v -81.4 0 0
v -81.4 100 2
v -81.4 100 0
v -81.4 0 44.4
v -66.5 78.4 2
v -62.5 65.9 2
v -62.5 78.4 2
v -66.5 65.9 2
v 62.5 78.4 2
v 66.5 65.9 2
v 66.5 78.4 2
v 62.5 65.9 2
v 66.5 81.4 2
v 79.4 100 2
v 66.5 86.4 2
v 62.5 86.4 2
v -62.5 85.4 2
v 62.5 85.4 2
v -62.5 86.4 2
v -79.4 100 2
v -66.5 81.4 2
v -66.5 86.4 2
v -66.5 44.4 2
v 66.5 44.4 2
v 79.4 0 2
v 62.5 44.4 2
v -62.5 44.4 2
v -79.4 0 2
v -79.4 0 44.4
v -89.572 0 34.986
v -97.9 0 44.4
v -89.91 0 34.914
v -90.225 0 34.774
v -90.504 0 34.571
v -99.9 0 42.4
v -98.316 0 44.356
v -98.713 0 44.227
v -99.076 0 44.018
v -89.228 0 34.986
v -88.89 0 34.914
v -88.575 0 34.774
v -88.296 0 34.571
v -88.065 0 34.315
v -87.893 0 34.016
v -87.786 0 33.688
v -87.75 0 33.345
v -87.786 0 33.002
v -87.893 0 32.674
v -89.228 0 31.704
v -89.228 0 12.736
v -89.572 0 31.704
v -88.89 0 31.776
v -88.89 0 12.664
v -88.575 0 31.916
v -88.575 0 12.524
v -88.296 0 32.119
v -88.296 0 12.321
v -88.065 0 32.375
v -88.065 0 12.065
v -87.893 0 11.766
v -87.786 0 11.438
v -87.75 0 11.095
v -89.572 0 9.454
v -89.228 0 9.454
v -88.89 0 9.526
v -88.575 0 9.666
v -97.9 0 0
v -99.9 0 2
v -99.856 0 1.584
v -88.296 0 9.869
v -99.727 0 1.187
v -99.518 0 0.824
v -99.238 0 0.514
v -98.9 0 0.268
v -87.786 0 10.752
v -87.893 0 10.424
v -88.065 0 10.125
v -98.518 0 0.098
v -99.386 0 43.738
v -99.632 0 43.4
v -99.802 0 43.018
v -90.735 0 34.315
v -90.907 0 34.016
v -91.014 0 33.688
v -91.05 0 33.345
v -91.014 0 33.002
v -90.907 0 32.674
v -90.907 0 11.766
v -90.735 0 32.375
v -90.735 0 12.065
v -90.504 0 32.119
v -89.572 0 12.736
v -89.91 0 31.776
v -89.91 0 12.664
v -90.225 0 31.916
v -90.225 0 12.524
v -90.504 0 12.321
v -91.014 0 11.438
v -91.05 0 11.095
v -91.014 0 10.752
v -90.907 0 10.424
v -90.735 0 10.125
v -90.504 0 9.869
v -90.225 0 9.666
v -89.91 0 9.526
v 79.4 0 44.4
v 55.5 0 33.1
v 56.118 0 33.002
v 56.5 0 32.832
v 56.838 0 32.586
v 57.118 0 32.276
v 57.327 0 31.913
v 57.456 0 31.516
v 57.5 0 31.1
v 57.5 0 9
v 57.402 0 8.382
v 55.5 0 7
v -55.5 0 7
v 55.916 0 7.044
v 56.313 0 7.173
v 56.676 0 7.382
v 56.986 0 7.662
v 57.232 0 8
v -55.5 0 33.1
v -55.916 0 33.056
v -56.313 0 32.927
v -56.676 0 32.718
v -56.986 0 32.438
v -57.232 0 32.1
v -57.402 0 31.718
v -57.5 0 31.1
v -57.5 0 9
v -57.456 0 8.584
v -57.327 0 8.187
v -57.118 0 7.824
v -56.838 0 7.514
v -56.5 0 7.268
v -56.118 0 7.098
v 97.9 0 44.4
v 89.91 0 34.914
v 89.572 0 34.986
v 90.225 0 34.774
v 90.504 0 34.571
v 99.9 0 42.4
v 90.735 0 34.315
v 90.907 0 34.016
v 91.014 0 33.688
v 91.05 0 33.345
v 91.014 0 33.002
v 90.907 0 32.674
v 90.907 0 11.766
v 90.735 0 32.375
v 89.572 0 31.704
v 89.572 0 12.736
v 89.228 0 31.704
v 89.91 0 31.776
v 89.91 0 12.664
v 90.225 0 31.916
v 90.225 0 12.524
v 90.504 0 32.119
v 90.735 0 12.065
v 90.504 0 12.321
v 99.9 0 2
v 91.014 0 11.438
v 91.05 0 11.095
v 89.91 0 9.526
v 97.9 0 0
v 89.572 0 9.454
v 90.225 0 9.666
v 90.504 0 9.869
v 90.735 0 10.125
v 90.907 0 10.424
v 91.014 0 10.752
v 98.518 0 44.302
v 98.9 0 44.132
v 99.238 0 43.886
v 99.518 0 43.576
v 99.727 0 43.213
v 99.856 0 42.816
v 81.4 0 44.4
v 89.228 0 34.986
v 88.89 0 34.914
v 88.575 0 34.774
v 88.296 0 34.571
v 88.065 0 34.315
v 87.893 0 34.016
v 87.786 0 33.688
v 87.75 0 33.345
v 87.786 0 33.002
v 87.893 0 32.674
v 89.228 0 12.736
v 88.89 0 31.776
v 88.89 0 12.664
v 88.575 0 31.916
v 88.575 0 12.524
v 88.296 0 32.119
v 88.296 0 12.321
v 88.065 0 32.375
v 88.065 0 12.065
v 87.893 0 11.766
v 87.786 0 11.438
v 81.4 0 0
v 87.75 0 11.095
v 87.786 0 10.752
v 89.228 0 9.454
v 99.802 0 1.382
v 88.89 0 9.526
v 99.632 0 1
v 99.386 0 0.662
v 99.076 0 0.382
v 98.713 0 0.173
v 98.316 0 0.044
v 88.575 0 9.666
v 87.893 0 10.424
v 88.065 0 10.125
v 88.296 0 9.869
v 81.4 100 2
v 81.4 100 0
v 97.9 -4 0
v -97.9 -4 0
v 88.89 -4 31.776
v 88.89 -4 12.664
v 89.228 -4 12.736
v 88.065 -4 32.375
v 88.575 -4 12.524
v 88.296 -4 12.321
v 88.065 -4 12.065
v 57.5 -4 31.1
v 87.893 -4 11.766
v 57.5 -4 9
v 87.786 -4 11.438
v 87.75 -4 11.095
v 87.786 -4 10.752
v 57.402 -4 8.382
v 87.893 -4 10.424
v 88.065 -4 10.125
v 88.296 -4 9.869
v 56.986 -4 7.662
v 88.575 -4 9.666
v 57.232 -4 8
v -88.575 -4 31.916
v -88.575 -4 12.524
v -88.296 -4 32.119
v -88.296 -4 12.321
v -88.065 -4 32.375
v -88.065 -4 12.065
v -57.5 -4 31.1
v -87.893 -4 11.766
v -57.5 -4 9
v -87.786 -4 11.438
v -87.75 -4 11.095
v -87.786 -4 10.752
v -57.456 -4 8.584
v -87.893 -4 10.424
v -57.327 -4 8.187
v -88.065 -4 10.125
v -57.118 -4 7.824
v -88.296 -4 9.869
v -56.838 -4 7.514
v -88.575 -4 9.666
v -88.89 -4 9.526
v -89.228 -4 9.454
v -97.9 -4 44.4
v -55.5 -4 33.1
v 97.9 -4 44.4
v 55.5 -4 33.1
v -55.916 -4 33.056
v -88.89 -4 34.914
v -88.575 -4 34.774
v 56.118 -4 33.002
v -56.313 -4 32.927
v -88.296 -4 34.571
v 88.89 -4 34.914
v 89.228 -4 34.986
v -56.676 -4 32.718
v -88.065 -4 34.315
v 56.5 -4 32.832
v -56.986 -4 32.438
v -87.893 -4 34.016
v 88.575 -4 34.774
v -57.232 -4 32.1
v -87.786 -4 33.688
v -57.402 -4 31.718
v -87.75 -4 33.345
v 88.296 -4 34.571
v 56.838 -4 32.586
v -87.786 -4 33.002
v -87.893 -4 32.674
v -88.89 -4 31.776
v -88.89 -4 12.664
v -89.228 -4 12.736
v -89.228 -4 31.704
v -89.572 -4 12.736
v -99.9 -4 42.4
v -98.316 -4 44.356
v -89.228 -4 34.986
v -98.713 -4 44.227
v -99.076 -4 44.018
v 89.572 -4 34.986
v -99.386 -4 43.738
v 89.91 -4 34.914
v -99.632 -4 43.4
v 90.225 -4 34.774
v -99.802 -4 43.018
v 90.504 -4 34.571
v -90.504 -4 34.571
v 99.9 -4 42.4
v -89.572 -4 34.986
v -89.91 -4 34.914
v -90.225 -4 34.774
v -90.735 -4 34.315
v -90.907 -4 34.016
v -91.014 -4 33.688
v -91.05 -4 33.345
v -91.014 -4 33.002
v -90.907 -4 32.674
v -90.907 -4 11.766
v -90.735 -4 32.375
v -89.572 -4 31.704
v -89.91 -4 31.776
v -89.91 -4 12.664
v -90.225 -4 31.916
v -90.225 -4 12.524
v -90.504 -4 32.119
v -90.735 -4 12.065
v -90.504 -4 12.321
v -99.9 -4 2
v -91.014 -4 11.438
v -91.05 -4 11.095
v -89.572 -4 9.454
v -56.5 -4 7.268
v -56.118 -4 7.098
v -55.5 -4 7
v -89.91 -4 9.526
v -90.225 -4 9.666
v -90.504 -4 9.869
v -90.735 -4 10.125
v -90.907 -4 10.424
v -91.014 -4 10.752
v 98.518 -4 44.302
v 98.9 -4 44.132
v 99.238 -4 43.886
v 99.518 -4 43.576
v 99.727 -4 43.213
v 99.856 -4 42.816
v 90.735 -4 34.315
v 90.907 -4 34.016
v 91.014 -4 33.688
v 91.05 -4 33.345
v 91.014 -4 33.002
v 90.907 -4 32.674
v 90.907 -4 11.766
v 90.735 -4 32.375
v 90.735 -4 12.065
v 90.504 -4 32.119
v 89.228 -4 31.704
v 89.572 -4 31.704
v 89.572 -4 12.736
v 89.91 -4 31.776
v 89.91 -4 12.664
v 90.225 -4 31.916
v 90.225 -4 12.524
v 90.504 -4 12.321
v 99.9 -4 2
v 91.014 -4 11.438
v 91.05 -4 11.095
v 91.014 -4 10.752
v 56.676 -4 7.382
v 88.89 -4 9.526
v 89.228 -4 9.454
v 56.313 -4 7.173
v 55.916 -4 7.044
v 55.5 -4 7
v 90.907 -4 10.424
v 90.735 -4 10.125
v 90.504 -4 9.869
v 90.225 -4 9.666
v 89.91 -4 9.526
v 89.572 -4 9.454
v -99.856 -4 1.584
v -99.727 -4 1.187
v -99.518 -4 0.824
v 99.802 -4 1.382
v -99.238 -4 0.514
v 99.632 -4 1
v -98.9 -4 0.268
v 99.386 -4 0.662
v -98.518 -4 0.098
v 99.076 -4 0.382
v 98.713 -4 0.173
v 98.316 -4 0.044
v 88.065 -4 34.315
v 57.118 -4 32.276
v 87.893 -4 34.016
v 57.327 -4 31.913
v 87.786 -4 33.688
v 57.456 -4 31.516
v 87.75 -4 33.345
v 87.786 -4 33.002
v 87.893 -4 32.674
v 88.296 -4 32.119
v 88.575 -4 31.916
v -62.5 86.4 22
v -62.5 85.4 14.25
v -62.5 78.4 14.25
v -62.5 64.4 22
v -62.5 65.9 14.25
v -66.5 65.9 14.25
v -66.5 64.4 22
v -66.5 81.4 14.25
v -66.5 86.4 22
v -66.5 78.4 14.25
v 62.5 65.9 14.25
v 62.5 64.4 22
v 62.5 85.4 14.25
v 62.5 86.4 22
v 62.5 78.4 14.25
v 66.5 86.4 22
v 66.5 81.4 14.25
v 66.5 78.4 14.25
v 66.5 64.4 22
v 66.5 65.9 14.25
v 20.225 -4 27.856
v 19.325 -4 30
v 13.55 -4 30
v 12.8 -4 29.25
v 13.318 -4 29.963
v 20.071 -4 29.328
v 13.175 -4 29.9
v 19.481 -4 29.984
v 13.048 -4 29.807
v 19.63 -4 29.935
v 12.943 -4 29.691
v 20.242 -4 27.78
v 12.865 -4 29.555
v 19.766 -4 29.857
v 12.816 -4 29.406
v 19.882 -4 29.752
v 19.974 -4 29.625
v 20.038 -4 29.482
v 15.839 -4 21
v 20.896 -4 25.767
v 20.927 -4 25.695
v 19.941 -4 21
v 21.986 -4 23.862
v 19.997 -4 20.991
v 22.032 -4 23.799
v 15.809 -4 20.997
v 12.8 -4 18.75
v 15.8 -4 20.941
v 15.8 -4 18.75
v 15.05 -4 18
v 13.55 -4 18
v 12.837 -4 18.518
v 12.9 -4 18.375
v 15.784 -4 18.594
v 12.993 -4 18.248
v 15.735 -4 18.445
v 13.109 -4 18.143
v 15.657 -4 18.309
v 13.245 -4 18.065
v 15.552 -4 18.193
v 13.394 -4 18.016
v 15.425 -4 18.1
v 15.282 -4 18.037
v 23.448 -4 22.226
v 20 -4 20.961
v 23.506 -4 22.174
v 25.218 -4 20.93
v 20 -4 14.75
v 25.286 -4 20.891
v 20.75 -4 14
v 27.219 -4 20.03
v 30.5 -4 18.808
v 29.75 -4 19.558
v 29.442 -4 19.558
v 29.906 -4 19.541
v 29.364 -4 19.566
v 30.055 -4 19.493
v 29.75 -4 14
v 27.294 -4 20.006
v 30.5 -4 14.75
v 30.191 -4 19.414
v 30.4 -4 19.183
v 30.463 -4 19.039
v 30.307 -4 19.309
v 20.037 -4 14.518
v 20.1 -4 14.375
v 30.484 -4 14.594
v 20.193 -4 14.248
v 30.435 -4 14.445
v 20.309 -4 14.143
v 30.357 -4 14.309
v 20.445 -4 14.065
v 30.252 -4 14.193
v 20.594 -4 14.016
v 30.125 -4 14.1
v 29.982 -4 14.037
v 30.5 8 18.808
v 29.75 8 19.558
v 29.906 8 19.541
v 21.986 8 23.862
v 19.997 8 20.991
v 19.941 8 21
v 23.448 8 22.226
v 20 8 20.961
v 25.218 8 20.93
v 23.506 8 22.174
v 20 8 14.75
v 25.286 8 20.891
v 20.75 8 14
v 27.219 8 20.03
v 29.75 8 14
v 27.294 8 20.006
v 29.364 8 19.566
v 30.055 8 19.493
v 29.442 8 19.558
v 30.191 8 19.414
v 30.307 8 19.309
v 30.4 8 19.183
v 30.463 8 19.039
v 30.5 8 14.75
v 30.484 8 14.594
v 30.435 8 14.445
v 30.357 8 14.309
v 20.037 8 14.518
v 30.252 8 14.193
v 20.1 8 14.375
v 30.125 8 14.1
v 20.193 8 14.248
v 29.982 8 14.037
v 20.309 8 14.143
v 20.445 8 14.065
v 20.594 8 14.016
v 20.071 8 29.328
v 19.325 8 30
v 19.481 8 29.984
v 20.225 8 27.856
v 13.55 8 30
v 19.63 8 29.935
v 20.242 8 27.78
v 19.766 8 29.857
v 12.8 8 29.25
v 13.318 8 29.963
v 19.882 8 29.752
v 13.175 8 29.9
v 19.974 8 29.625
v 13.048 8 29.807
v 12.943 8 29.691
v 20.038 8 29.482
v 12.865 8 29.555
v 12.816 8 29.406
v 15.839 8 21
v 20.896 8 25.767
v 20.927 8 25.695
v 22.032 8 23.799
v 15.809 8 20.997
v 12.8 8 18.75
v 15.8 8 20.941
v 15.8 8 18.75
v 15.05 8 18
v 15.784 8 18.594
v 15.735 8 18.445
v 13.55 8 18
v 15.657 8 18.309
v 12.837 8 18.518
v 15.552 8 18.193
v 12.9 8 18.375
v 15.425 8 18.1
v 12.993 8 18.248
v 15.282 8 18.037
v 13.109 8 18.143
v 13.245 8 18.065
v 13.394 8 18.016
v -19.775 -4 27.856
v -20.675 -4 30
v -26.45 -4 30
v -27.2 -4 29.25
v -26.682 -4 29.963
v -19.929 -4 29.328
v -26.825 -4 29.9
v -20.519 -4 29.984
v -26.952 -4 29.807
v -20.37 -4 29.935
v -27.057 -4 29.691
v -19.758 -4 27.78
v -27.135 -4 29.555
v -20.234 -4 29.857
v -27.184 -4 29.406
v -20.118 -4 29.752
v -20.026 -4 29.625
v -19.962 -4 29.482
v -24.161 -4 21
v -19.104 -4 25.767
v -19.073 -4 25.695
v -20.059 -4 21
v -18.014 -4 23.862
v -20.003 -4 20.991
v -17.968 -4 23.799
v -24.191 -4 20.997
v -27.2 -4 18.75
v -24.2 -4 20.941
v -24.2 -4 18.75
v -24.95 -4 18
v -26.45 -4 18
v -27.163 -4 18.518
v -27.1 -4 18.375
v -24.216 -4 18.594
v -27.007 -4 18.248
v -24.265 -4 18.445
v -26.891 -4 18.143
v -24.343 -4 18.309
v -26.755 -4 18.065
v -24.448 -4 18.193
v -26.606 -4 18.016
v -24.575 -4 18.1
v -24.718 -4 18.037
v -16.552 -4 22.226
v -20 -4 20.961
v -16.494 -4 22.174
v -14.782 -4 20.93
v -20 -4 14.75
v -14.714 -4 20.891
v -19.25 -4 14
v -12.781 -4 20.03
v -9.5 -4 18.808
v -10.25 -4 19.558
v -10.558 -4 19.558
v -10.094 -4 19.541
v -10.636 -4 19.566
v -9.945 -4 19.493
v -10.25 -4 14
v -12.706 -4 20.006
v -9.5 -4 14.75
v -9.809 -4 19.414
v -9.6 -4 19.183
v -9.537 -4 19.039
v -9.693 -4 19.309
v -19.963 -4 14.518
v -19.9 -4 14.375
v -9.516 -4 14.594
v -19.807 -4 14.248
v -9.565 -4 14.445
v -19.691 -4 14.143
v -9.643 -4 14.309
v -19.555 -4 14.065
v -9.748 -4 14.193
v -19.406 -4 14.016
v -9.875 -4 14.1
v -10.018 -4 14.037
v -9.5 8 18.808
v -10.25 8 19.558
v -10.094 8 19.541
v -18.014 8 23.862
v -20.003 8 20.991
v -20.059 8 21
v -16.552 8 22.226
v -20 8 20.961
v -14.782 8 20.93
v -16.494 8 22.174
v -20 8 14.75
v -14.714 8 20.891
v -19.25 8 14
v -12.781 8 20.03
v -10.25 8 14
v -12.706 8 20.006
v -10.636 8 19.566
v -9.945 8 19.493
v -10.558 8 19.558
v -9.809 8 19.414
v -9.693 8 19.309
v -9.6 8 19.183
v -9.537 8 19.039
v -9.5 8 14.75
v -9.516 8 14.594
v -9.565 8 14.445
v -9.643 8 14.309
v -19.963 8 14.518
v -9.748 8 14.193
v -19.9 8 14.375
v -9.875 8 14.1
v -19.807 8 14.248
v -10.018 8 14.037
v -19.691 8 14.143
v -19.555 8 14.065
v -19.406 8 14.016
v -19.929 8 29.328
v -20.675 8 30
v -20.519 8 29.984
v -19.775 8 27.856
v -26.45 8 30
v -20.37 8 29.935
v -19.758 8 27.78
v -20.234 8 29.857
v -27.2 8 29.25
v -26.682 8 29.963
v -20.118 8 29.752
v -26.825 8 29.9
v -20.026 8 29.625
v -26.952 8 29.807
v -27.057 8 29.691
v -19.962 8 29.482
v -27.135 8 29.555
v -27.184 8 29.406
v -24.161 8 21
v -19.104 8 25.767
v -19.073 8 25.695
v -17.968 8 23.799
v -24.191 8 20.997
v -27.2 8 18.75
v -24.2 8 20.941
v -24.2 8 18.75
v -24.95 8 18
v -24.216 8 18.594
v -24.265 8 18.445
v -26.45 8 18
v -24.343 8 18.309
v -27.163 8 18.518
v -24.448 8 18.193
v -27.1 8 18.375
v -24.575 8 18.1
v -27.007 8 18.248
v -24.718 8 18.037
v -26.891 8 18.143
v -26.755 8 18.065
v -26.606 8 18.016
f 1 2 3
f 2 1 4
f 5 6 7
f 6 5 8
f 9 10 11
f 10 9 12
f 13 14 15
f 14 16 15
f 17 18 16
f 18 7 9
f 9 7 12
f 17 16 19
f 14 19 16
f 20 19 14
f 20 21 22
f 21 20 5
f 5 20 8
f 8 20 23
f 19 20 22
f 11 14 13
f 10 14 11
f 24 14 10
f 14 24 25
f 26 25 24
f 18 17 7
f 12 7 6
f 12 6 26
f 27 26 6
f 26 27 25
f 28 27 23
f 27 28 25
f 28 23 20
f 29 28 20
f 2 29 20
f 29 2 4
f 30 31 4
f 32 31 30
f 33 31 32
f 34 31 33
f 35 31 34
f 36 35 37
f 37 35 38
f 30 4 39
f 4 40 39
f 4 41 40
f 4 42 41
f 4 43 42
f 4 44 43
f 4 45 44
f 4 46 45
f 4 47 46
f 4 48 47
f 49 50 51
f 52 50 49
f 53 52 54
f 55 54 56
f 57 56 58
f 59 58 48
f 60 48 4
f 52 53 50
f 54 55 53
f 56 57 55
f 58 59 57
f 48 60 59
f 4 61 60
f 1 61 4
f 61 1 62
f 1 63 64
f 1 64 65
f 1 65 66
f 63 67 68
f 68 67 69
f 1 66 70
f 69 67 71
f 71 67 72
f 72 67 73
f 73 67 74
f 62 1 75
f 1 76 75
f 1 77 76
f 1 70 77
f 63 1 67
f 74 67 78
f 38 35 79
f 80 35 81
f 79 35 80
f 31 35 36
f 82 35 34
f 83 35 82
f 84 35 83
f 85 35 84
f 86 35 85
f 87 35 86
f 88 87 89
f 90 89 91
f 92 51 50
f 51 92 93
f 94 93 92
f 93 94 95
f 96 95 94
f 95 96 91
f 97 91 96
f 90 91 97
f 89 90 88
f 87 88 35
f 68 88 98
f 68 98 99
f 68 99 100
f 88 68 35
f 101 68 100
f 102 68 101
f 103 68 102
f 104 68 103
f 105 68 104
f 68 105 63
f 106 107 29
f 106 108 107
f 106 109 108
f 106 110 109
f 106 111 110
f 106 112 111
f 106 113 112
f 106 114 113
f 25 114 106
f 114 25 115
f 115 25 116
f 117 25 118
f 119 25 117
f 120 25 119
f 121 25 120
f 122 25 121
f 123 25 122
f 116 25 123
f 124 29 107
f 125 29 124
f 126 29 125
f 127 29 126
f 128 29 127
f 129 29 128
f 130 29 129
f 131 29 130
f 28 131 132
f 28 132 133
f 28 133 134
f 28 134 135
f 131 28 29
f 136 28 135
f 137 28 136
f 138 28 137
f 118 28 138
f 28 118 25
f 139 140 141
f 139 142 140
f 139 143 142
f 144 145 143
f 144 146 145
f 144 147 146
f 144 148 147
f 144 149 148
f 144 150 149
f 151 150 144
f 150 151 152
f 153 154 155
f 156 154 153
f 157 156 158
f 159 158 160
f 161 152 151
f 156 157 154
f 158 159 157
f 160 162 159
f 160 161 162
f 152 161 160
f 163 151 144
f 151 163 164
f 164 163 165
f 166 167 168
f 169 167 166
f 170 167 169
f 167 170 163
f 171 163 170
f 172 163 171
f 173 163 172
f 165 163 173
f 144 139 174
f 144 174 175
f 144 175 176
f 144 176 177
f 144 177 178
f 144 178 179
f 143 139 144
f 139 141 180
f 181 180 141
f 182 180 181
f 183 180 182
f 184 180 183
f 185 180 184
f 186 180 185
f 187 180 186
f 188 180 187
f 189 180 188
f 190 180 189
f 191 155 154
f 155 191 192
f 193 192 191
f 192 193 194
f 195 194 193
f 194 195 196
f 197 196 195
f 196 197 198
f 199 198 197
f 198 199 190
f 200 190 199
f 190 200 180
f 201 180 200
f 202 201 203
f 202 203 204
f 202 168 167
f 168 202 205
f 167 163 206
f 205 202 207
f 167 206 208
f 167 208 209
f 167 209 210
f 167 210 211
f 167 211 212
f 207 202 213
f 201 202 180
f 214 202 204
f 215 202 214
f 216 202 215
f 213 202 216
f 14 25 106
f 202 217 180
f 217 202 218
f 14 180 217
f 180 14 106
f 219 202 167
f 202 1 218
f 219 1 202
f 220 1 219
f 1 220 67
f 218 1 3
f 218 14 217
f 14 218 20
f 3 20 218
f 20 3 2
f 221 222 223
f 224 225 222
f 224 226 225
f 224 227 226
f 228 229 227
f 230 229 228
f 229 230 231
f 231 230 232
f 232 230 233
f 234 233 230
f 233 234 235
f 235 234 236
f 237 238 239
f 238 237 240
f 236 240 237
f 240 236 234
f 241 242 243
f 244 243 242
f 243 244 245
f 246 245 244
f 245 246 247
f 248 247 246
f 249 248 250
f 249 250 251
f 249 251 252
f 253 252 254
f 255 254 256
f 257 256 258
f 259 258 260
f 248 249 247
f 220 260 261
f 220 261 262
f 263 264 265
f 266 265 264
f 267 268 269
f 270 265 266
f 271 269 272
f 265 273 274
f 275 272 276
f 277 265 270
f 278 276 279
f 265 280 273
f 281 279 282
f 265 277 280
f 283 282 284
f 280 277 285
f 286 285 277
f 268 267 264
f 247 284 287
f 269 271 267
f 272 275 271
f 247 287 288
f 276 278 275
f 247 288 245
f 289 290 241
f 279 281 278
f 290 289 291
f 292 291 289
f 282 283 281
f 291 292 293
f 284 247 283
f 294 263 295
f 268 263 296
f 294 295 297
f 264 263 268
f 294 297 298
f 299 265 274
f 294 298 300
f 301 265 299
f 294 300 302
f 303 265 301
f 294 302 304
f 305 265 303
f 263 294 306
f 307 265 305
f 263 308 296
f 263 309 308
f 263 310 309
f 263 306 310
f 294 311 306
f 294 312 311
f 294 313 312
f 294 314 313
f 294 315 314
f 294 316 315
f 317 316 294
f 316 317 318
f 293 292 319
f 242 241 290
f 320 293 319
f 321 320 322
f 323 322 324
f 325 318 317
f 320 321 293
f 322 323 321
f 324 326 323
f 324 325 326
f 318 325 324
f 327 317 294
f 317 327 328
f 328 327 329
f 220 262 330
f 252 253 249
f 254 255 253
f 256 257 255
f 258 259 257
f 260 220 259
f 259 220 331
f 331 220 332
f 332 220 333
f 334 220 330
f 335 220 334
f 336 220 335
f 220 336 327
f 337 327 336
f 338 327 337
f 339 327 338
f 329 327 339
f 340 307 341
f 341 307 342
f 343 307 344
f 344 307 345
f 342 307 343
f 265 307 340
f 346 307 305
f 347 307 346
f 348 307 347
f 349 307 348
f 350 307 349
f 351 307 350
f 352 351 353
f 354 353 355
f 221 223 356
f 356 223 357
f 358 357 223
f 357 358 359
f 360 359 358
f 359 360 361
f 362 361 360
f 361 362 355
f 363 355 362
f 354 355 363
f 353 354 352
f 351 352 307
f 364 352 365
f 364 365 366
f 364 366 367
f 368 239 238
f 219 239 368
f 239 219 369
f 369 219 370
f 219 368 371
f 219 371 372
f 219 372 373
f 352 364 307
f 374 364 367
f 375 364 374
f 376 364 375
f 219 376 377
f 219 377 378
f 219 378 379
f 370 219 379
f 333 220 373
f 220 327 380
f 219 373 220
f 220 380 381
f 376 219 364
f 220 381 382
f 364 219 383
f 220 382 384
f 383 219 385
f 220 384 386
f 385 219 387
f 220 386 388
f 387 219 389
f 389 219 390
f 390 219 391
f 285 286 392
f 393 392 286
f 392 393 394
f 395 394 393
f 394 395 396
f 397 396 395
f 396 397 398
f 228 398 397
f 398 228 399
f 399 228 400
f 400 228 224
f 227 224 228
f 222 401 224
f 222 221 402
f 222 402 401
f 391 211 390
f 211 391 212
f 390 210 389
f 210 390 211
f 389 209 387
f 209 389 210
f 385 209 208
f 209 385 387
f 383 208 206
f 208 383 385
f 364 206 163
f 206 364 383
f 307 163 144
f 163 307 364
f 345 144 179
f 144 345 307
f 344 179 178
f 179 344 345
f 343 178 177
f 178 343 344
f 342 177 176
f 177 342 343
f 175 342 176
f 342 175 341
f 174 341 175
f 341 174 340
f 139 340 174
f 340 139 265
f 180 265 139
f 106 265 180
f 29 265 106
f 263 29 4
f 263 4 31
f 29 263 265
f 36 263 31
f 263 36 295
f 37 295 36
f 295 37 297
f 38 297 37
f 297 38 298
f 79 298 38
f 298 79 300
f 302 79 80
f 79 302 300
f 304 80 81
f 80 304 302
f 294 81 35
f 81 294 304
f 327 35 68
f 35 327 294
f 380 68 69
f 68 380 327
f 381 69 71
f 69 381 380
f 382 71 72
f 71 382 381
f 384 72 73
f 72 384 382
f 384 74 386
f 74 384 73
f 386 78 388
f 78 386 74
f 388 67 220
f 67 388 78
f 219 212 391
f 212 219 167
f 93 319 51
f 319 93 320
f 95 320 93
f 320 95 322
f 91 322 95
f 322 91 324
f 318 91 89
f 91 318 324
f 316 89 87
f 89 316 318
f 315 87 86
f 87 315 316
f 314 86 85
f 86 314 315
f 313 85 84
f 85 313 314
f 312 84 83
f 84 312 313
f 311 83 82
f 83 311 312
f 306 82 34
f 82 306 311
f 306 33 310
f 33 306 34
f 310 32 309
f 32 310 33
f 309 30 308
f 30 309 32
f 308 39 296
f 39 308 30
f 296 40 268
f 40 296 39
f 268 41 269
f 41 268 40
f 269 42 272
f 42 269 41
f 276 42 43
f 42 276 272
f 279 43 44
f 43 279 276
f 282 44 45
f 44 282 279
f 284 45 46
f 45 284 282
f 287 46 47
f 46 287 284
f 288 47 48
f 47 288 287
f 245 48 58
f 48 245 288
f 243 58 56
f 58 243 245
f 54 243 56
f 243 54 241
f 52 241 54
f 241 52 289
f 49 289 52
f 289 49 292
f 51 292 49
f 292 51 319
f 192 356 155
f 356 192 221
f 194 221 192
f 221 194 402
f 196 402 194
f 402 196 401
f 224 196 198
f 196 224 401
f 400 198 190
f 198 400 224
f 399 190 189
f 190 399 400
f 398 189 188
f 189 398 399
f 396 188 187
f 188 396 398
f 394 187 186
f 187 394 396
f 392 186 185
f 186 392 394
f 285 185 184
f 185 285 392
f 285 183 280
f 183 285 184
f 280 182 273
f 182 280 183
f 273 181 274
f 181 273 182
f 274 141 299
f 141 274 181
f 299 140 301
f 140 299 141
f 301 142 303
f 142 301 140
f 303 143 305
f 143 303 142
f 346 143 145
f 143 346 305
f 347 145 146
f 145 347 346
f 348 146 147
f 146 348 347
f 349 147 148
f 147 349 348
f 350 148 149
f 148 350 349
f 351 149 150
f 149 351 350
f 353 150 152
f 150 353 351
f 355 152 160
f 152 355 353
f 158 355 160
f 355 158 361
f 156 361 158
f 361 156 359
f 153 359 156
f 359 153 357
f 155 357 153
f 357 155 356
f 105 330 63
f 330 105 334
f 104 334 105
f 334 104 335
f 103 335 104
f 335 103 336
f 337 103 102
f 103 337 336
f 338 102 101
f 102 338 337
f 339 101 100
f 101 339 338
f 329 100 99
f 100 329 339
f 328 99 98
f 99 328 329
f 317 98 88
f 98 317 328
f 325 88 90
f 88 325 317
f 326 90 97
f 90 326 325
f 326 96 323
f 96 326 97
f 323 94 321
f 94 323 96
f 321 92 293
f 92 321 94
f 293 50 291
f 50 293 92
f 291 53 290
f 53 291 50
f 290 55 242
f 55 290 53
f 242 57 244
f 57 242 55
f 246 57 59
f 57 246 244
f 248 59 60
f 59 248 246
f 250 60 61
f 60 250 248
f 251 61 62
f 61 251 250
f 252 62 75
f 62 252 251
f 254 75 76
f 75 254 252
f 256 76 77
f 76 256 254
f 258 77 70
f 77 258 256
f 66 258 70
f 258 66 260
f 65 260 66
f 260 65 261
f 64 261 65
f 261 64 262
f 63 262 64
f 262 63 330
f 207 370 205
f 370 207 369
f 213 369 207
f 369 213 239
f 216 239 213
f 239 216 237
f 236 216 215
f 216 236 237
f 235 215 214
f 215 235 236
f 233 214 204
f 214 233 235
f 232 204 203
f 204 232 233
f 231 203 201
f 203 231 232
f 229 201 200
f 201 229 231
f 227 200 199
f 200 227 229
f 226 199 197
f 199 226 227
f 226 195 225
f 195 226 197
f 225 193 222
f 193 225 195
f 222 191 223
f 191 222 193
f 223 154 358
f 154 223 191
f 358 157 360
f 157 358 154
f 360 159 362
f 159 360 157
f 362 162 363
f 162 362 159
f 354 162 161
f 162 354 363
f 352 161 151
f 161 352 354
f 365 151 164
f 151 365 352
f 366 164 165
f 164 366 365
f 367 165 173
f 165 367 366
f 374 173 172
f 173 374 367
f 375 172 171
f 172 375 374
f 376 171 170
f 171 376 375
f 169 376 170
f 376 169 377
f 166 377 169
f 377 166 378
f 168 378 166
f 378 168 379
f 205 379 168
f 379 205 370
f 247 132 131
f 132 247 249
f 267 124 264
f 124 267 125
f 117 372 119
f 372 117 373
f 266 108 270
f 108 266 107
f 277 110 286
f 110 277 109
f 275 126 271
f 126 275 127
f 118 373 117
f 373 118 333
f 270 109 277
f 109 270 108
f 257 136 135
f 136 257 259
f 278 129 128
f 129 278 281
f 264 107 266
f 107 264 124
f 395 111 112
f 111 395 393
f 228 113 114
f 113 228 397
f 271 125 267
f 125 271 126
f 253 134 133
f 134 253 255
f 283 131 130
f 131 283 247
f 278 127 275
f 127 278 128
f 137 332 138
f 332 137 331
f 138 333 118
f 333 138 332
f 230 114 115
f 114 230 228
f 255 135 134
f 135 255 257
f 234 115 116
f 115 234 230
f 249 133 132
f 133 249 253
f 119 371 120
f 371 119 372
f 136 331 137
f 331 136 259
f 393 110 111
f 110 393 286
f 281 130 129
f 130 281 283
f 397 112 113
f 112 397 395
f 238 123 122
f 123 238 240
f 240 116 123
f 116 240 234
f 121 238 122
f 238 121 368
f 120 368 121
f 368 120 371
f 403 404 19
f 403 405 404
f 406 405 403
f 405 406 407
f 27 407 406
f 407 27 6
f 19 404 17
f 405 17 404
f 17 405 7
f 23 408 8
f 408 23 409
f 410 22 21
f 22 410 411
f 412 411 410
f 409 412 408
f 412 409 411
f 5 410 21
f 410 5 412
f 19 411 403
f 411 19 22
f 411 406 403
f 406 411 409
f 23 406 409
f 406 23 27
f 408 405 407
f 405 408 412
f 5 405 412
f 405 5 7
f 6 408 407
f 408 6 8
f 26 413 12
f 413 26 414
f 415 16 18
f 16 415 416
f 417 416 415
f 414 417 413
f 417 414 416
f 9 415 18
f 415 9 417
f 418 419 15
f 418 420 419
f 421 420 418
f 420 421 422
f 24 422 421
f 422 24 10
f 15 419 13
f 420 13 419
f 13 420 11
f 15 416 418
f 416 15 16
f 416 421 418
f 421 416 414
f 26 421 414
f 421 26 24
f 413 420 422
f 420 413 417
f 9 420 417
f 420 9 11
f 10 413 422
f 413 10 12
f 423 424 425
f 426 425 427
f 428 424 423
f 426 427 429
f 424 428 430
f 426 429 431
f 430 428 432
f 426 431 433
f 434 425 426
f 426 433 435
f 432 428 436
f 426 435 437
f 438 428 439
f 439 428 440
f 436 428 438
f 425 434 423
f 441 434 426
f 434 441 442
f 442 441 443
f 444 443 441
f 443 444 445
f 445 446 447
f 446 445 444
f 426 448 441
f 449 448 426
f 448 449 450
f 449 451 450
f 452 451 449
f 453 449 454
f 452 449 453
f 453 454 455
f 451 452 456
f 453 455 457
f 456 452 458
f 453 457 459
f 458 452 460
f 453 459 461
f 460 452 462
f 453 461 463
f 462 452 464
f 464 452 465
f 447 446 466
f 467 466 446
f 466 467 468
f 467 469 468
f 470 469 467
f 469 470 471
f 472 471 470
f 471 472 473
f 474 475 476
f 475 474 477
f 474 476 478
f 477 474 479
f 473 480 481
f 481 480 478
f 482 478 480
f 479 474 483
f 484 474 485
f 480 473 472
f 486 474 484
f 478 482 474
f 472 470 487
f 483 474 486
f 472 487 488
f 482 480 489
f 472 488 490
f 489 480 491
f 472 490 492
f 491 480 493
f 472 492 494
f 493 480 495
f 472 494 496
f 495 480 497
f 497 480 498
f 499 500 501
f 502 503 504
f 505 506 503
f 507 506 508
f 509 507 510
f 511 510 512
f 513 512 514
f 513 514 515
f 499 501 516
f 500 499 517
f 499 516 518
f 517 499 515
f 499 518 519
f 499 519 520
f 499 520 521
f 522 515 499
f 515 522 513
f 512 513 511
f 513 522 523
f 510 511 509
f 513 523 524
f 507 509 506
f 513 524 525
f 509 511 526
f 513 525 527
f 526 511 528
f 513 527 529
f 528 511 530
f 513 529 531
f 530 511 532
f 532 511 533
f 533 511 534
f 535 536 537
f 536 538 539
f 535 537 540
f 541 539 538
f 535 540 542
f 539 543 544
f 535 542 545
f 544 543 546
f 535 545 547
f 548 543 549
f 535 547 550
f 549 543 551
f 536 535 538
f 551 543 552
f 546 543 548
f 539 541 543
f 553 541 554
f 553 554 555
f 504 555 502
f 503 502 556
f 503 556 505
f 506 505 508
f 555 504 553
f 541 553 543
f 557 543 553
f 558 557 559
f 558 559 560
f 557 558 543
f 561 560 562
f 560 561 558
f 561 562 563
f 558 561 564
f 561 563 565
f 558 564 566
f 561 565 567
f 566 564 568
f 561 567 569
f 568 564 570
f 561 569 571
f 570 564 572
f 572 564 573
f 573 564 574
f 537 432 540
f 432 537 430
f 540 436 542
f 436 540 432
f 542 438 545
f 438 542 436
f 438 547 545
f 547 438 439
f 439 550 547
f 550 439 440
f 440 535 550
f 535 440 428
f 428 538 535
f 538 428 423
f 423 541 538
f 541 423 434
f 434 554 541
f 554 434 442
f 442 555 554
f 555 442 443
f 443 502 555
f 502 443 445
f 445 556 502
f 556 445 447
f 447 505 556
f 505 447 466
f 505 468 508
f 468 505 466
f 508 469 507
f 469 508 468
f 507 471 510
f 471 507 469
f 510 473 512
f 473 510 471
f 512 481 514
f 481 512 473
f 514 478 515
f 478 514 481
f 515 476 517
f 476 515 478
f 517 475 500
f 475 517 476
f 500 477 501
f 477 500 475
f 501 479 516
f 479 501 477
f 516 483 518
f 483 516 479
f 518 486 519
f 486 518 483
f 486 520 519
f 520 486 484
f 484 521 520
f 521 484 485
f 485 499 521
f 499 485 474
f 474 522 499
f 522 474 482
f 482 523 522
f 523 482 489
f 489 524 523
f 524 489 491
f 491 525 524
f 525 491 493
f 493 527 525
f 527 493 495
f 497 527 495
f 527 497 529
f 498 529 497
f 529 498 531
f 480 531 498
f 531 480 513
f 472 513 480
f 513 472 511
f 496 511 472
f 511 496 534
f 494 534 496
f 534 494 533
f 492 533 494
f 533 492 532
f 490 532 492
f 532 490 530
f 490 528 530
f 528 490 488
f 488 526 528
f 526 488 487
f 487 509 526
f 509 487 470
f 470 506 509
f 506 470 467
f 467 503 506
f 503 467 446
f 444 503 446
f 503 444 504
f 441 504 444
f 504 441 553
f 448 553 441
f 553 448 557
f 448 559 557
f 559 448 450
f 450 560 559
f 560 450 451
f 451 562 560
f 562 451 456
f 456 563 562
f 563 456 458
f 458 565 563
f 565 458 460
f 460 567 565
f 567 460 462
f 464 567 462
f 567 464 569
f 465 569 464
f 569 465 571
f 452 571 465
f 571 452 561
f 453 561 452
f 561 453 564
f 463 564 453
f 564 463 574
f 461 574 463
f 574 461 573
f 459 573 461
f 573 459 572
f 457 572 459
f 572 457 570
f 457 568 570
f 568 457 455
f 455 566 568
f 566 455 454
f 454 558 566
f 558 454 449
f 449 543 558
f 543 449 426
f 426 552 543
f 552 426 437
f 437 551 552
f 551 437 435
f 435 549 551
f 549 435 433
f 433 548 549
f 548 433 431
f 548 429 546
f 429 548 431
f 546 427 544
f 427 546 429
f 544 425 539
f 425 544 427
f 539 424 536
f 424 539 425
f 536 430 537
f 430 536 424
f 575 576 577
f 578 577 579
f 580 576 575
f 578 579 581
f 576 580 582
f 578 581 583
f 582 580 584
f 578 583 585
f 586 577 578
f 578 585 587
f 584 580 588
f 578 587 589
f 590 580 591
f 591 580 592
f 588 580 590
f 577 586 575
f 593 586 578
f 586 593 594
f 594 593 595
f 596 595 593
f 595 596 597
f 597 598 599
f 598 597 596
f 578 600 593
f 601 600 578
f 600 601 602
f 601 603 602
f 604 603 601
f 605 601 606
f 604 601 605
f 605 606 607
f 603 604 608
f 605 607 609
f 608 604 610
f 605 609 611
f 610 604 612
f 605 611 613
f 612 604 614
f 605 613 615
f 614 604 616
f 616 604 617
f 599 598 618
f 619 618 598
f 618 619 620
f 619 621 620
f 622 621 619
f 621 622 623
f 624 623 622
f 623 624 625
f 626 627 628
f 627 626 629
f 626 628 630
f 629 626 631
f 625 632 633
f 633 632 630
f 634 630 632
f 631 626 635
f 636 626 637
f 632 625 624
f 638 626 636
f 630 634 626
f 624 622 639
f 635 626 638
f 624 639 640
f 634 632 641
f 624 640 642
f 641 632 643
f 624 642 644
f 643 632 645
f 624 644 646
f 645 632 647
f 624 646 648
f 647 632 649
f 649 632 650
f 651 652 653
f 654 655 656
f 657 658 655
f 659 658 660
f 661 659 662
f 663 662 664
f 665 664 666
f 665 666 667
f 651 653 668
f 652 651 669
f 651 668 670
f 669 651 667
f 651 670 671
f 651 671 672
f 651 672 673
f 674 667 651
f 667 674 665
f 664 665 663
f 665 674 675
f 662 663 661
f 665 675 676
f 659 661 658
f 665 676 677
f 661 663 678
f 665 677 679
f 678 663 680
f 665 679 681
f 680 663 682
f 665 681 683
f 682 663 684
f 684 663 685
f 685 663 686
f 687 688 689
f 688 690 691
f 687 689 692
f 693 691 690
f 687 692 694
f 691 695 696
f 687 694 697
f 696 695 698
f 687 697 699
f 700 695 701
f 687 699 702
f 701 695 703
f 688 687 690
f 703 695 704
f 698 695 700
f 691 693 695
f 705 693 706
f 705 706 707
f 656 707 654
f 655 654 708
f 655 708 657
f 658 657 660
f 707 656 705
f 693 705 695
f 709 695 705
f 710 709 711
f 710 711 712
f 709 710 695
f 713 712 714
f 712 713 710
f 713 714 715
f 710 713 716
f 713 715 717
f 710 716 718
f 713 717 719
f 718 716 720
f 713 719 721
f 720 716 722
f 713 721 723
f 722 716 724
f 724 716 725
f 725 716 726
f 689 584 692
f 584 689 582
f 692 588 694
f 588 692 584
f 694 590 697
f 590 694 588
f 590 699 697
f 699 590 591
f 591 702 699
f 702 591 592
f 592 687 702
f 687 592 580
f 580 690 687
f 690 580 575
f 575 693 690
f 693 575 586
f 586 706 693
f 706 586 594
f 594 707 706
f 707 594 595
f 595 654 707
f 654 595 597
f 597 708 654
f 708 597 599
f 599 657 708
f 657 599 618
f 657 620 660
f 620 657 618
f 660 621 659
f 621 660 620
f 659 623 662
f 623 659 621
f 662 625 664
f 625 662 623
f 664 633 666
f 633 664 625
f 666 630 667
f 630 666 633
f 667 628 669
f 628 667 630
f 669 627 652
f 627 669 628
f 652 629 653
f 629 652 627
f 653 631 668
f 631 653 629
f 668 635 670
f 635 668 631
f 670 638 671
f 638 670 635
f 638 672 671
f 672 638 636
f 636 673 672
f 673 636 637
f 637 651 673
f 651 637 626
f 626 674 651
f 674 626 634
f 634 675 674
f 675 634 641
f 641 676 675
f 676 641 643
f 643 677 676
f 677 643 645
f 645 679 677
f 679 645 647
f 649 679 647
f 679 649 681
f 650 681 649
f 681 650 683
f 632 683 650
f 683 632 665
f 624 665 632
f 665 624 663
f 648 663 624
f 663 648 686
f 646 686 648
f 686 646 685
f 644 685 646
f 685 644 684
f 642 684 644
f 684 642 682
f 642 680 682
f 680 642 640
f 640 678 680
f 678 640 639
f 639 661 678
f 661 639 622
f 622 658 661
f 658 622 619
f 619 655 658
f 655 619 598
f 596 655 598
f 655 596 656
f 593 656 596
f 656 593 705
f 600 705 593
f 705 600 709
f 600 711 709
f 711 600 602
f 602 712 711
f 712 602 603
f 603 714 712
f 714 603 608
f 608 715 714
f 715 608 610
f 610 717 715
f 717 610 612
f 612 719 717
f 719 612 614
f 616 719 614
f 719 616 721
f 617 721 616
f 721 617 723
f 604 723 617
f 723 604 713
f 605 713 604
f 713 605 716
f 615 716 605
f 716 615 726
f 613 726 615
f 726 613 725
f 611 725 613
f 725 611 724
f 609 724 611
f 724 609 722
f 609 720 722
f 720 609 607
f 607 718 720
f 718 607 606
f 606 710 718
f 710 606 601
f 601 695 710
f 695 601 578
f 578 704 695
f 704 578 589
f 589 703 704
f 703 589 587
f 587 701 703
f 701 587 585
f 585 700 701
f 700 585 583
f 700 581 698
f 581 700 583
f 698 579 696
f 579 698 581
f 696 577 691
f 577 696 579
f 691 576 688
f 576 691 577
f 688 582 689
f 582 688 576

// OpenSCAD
// file: microlab-2.scad
/* [Hidden] */
ML2_FRAME_THICKNESS = 4;
ML2_FRAME_RADIUS = 2;
ML2_FRAME_HEIGHT = 44.4;
ML2_FRAME_HEIGHT_GAP = 0.10;
ML2_FRAME_SIDE_WIDTH_INSIDE = 18.5;
ML2_FRAME_WIDTH_INSIDE = 162.8;
ML2_FRAME_HOLE_FROM_EDGE = 10.5;
ML2_FRAME_HOLE2_FROM_BOTTOM = 33.345;
ML2_FRAME_HOLE1_FROM_BOTTOM = 11.095;
ML2_FRAME_HOLE_DIA = 3.3;

function HeightFromNumberUnits(numberUnits) =
    numberUnits * ML2_FRAME_HEIGHT + (numberUnits-1) * ML2_FRAME_HEIGHT_GAP;

//FrontPlate(1, showRear=false, openFace=true, valign="left", halign="bottom") {
//    Shelf();
//}

module FrontPlate(numberUnits = 1, showRear=false, openFace=false, valign="bottom", halign="inside-left") {
    totalWidth = ML2_FRAME_WIDTH_INSIDE + 2 * ML2_FRAME_SIDE_WIDTH_INSIDE;
    height = HeightFromNumberUnits(numberUnits);
    
    x = halign == "center" ? totalWidth/2
        : halign == "inside-left" ? ML2_FRAME_SIDE_WIDTH_INSIDE
        : halign == "inside-right" ? totalWidth - ML2_FRAME_SIDE_WIDTH_INSIDE
        : 0;

    z = valign == "top" ? height
        : valign == "middle" ? height/2
        : 0;
    
    translate([-x,0,-z]) {
        rotate([90,0,0]) {
            linear_extrude(ML2_FRAME_THICKNESS)
                difference() {
                    // Front plate
                    if (openFace) {
                        union() {
                            w = ML2_FRAME_SIDE_WIDTH_INSIDE + 2;
                            // Left
                            offset(ML2_FRAME_RADIUS, $fn=30) offset(-ML2_FRAME_RADIUS)
                                square([w, height]);
                            translate([w- ML2_FRAME_RADIUS,0,0]) square([ML2_FRAME_RADIUS, height]);
                            // Right
                            translate([totalWidth - w,0,0]) {
                            offset(ML2_FRAME_RADIUS, $fn=30) offset(-ML2_FRAME_RADIUS)
                                square([w, height]);
                            square([ML2_FRAME_RADIUS, height]);
                            }
                        }
                    } else {
                        offset(ML2_FRAME_RADIUS, $fn=30) offset(-ML2_FRAME_RADIUS)
                            square([totalWidth, height]);
                    }
                    // Fixing holes
                    for (y = [0:numberUnits-1]) translate([0,y * (ML2_FRAME_HEIGHT + ML2_FRAME_HEIGHT_GAP),0]) {
                        translate([ML2_FRAME_HOLE_FROM_EDGE, ML2_FRAME_HOLE1_FROM_BOTTOM]) circle(d=ML2_FRAME_HOLE_DIA, $fn=30);
                        translate([ML2_FRAME_HOLE_FROM_EDGE, ML2_FRAME_HOLE2_FROM_BOTTOM]) circle(d=ML2_FRAME_HOLE_DIA, $fn=30);
                        translate([totalWidth-ML2_FRAME_HOLE_FROM_EDGE, ML2_FRAME_HOLE1_FROM_BOTTOM]) circle(d=ML2_FRAME_HOLE_DIA, $fn=30);
                        translate([totalWidth-ML2_FRAME_HOLE_FROM_EDGE, ML2_FRAME_HOLE2_FROM_BOTTOM]) circle(d=ML2_FRAME_HOLE_DIA, $fn=30);
                    }
                }
        }
        if (showRear) {
            %translate([ML2_FRAME_SIDE_WIDTH_INSIDE,0,0]) cube([ML2_FRAME_WIDTH_INSIDE, 100, height]);
        }
        children();
    }
}

module Shelf(numberUnits = 1, depth=100, shelfThickness=2.55, supportThickness=2) {
    height = HeightFromNumberUnits(numberUnits);
    translate([ML2_FRAME_SIDE_WIDTH_INSIDE,0,0]) {
        translate([0,-ML2_FRAME_THICKNESS,0]) cube([ML2_FRAME_WIDTH_INSIDE, depth + ML2_FRAME_THICKNESS, shelfThickness]);
        for (x = [0, ML2_FRAME_WIDTH_INSIDE - supportThickness]) {
            translate([x,0,0])
                rotate([90,0,90]) linear_extrude(supportThickness) polygon([
                    [0, shelfThickness],
                    [0, height],
                    [depth, shelfThickness],
                ]);
        }
    }
}
// main file
// https://www.amazon.co.uk/dp/B0F8QLDLBL

include <microlab-2.scad>

Thickness = 2;

WIDTH = 125;
HEIGHT = 34.1;
DEPTH = 79.4;
RADIUS = 10.5;

FRAME_TOP = 3;
FRAME_BOTTOM = 5;
FRAME_SIDE = 5;

$fn = 30;

difference() {
    FrontPlate(1, false, halign="center") {
        Shelf(shelfThickness=Thickness);
    }
    
    // Move to top of shelf
    translate([0,0,Thickness]) {        
        // Cutout
        cutout_width = WIDTH - 2 * FRAME_SIDE;
        cutout_height = HEIGHT - FRAME_TOP - FRAME_BOTTOM;
        translate([-cutout_width/2, 0.01, FRAME_BOTTOM]) 
            rotate([90,0,0]) linear_extrude(10) offset(2) offset(-2) square([cutout_width, cutout_height]);
    }
    
    // Text
//    translate([WIDTH_INSIDE,-3,22]) rotate([90,0,0]) linear_extrude(4) text("12V / 5V PSU", valign="center", halign="right");
   
};

// Move to top of shelf
translate([0,0,Thickness]) {
    for (m = [0:1]) mirror([m,0]) {
        difference() {
            // Holders
            holder_width = 4;
            holder_thickness = 4;
            holder_height = 12 + 4;        
            translate([-WIDTH/2 + holder_width - holder_thickness, DEPTH ,0])
                rotate([0,-90,0]) {
                    points = [
                        [0,7], [0,-15-20], [20, -15], [20,7],
                    ];
                    %for (i = [0:len(points)-1]) translate([points[i].x, points[i].y, 13]) text(str(i), size=1, halign="center");
                    linear_extrude(holder_width) polygon(points);
                }
            translate([-WIDTH/2,DEPTH,0]) Stop(true);
        }
            
    }
    // USB PSU
    %translate([-WIDTH/2,0,0])
            linear_extrude(HEIGHT) offset(RADIUS) offset(-RADIUS) square([WIDTH, DEPTH]);
    %translate([-WIDTH/2,DEPTH,0]) Stop(true);
}

translate([20,-4,20]) rotate([-90,0,0]) Stop();
translate([-20,-4,20]) rotate([-90,0,0])  Stop();
//%translate([0,-50,0]) {
//    Stop(true);
//    #sphere(2);
//}

// Stop creates the end stop that fits into the wings, and optional a mask
// version that is extended to allow the peg to fit in and slide
module Stop(mask=false) {
    //              5─────────────────────────────6
    //      b       │      f         ----/        │
    //    1───2    e│              /              │
    //    │   │     │           /                 │
    //    │  c│     │         /                   │
    //    │   │  d  │       /                     │
    //   a│   3─────4 ORG  /                      │
    //    │               |                       │
    //    │              /                        │
    //    │             |                         │
    //    │            /                          │
    //    │           |                           │
    //    │    g     /                            │
    //    0───────────────────────────────────────7
    
    a = 12;
    b = 3;
    c = 3;
    d = 4 + (mask ? 0 : 0.2); // Thickness of mating plate
    e = c + 4; // Keep e long as it has the pressure of the unit pushing on it
    f = RADIUS;
    g = b+d+f;
    top = a + e - c;
    
    points = [
        // 0    1       2       3        4            5          6          7
        [0,0], [0,a], [b,+a], [b,a-c], [b+d,a-c], [b+d,top], [b+d+f,top], [g,0],
    ];
    
    translate([-b-d,-a+c-1]) {
        %for (i = [0:len(points)-1]) translate([points[i].x, points[i].y, 13]) text(str(i), size=1, halign="center");
        linear_extrude(12 + (mask ? 0.25 : 0)) offset(mask ? 0 : 0.75) offset(mask ? 0 : -0.75) difference() {
            union() {
                polygon(points);
                if (mask) { // Extend to allow the catch to enter and slide
                    translate([0,-c-0.5]) square(b+d, c+0.5);
                }
            }
            translate([b+d+RADIUS,0]) circle(r=RADIUS);
        }
    }
}
